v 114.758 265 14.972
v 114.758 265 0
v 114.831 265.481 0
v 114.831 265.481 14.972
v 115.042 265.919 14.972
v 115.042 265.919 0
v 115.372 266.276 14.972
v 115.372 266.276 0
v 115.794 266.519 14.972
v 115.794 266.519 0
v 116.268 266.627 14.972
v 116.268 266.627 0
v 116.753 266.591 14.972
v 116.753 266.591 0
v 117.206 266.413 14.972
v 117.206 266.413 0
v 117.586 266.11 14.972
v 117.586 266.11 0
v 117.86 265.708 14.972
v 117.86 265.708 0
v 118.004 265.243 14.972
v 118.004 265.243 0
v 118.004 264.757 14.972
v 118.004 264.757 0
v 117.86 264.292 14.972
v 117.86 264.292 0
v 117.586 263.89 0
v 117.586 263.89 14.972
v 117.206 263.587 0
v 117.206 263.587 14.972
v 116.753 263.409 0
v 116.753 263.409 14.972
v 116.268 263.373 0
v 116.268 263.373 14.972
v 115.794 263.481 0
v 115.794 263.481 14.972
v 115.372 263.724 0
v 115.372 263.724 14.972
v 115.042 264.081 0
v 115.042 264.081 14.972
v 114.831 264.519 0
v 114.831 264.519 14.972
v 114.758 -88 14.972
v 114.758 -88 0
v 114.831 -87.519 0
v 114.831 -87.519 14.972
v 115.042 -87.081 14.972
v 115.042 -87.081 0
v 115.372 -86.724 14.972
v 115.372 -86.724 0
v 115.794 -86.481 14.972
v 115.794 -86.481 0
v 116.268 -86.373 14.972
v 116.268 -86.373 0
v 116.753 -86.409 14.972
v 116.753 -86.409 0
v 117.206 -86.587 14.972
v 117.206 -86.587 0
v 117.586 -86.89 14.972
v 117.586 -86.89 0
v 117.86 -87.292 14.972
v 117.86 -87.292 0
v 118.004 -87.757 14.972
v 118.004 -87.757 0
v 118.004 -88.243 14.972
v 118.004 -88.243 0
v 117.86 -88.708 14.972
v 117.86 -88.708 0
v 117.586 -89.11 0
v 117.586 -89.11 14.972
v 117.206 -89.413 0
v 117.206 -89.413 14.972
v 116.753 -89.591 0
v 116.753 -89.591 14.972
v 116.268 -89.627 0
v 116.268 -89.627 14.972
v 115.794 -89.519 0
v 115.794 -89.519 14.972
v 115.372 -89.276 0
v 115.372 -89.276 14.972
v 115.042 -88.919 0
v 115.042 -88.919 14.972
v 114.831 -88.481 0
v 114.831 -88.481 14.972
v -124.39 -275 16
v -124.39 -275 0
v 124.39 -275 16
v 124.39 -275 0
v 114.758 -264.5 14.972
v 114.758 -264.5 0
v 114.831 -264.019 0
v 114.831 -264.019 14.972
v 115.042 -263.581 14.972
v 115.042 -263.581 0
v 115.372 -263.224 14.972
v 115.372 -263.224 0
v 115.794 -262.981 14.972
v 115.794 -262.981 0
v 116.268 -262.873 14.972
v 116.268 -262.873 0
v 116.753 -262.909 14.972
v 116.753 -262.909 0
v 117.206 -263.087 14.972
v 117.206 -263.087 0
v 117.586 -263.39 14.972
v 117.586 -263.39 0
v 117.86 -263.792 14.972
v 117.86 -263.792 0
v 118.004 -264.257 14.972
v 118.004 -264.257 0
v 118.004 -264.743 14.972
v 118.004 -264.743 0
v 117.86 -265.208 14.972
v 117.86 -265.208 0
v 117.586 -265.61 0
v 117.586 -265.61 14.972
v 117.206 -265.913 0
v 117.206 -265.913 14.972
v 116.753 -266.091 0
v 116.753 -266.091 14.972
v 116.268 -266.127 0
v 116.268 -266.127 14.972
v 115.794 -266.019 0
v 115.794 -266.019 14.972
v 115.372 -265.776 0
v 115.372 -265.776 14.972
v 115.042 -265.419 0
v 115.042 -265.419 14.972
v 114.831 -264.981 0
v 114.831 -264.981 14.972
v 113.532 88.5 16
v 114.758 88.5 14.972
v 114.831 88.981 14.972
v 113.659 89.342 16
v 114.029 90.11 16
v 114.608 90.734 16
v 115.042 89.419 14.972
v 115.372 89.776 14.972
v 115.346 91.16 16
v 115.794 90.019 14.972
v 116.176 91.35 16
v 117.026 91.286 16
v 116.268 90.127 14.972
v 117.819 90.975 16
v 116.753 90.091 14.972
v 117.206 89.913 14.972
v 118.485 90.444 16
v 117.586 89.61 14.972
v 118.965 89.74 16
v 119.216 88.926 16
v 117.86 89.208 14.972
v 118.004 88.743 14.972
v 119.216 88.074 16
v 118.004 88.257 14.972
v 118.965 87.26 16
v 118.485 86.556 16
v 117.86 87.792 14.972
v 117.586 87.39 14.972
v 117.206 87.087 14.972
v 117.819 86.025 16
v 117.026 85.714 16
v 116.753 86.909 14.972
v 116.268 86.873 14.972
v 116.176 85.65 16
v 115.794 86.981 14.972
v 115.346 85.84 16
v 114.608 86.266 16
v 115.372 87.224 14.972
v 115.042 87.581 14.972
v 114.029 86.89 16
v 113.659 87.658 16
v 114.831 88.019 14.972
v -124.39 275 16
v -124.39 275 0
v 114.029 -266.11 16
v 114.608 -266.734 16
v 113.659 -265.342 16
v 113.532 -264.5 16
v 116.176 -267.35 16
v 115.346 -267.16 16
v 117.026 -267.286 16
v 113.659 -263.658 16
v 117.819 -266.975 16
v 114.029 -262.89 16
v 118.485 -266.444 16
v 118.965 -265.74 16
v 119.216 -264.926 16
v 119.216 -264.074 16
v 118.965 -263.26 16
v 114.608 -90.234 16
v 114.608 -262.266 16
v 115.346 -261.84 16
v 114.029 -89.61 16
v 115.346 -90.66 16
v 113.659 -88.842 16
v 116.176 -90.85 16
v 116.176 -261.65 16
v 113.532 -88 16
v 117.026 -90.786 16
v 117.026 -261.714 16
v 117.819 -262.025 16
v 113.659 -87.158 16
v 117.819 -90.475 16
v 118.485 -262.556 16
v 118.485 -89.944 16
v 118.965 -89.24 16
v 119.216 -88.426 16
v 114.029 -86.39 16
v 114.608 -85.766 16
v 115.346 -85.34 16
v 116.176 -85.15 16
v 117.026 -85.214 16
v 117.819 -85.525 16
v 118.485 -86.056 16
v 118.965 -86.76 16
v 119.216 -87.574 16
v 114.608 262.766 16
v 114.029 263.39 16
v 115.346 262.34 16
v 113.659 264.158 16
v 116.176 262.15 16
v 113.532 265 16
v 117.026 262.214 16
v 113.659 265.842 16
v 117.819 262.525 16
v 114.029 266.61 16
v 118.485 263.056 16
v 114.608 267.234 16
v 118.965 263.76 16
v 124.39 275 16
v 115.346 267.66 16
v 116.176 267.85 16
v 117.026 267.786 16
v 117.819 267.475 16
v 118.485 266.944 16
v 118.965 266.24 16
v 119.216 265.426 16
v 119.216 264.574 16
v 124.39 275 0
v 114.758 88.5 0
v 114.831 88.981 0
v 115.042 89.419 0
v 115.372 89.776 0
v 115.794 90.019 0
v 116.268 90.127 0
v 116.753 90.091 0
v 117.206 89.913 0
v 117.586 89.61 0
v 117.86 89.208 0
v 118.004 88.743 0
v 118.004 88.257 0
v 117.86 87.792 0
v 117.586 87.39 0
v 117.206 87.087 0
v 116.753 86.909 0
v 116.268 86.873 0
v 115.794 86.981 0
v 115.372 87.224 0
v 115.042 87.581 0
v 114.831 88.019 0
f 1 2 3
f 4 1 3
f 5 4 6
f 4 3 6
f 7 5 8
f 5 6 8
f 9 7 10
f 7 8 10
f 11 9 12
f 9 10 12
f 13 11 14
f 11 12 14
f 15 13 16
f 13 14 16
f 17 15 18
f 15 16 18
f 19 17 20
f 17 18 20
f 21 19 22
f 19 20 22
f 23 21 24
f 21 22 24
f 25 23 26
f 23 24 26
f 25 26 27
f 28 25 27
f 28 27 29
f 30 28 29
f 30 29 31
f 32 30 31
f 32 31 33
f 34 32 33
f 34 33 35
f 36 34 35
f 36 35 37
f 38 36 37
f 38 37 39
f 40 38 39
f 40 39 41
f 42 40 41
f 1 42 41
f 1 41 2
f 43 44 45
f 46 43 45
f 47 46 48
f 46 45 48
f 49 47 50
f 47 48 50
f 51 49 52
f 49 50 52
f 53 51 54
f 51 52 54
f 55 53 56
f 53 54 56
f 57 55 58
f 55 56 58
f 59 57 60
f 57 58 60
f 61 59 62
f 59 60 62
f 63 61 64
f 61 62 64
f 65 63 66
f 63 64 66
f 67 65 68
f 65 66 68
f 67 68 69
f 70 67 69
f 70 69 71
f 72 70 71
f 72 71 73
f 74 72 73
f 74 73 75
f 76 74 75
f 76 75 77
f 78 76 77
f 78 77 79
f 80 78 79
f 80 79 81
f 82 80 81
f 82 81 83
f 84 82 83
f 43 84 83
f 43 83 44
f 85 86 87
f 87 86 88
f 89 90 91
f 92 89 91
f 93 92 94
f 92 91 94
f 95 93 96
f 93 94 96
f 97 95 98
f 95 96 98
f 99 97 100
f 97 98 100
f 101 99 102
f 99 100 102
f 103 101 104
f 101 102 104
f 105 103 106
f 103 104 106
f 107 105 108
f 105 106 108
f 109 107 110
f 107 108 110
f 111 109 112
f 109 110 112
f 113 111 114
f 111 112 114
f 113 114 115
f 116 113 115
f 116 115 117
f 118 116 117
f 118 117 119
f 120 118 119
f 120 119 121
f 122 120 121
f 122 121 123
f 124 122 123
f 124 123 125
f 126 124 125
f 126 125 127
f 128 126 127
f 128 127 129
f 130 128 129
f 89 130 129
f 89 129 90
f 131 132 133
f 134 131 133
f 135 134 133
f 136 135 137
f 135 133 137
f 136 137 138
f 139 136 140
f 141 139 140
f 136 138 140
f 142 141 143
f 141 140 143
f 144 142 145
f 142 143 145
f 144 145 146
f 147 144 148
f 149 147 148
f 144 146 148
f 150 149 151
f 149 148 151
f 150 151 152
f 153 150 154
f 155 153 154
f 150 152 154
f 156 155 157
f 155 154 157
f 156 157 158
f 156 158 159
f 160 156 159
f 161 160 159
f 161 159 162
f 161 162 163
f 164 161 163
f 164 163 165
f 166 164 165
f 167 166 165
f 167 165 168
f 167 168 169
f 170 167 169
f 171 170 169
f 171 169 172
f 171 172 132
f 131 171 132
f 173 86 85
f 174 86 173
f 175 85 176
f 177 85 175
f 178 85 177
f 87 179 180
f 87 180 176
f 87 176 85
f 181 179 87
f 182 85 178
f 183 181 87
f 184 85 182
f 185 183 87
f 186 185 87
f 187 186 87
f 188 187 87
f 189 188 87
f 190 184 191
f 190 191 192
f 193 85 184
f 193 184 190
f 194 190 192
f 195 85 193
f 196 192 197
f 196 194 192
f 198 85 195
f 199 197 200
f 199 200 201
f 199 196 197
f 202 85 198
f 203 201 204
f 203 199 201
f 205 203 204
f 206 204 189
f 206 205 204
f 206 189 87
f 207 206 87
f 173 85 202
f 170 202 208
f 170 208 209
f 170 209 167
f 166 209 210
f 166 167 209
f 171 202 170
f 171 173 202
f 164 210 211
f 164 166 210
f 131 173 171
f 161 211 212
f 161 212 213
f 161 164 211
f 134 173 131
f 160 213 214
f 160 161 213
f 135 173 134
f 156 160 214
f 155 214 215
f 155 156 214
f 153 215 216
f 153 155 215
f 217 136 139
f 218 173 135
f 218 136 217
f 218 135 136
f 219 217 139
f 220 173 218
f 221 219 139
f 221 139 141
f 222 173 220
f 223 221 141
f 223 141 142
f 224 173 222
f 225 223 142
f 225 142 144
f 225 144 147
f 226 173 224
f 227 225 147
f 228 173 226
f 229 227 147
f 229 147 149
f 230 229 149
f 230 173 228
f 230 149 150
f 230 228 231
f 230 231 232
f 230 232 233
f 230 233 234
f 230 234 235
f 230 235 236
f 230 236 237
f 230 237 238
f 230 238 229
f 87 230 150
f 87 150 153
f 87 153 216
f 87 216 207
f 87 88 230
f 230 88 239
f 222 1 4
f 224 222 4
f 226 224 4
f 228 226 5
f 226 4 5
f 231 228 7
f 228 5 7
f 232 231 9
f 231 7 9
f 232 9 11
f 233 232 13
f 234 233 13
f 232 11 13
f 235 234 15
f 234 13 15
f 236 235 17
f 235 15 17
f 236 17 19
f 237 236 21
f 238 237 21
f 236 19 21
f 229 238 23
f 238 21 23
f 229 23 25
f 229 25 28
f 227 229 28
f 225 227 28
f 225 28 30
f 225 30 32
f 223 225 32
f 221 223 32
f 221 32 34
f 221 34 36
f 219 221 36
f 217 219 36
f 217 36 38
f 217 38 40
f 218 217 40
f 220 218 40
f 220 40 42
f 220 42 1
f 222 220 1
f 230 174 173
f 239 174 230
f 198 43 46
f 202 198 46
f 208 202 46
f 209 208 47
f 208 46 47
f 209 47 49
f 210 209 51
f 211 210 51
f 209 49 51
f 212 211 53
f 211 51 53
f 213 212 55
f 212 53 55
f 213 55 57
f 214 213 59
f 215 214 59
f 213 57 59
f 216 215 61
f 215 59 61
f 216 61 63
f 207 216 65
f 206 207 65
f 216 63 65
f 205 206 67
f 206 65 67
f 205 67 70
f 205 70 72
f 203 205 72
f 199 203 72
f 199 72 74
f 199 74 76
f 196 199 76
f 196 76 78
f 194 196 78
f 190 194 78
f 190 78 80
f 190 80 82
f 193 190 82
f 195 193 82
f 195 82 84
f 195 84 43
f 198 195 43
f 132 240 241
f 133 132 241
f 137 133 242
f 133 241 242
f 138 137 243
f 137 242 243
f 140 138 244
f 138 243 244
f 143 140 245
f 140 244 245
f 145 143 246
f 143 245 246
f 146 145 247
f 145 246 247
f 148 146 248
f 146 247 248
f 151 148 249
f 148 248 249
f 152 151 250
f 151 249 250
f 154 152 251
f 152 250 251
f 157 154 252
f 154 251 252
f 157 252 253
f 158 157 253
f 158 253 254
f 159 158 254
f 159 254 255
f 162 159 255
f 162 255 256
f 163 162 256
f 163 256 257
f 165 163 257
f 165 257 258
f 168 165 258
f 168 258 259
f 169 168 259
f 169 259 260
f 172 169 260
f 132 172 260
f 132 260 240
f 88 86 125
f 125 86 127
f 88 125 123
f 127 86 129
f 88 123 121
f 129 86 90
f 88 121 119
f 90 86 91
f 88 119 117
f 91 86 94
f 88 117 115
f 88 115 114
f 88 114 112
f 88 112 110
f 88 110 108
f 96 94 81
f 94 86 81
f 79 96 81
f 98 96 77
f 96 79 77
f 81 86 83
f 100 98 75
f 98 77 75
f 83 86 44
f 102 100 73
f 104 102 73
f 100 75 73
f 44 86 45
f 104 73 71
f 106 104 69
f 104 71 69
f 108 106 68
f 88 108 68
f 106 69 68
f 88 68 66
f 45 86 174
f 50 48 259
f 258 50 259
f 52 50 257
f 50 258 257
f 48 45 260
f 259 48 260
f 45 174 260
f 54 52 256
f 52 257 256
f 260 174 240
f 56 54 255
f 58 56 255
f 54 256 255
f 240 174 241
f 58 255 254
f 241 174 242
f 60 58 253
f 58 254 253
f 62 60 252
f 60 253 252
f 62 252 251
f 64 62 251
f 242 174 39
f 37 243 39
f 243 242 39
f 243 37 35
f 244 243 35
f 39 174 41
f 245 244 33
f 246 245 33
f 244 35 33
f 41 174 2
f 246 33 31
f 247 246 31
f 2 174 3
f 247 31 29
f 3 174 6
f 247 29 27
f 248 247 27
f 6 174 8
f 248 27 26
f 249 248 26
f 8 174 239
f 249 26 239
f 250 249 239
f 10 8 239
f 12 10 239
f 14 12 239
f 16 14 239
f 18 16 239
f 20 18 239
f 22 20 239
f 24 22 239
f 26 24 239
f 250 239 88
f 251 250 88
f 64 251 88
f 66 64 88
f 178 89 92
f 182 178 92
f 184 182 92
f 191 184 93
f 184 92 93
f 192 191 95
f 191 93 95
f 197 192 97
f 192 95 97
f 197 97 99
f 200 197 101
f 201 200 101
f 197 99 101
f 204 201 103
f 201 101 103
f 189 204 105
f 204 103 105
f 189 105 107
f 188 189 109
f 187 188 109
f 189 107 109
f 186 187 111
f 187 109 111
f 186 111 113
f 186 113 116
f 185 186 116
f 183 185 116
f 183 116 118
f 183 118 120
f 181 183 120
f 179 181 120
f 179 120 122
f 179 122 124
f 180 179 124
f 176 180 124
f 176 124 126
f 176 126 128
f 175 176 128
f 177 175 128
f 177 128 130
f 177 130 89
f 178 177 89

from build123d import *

# Parameters (mm, degrees)
SKETCH1_W                                         = 248.78
SKETCH1_H                                         = 550
BOSS_EXTRUDE1_DEPTH                               = 16
CSK_FOR_4_FLAT_HEAD_MACHINE_SCREW_100_D           = 3.2639
CSK_FOR_4_FLAT_HEAD_MACHINE_SCREW_100_DEPTH       = 16
CSK_FOR_4_FLAT_HEAD_MACHINE_SCREW_100_CSINK_D     = 5.715
CSK_FOR_4_FLAT_HEAD_MACHINE_SCREW_100_CSINK_ANGLE = 100
LPATTERN1_COUNT                                   = 4
LPATTERN1_PITCH                                   = 176.5


with BuildPart() as part:
    # Sketch1 → Boss-Extrude1 (new body)
    with BuildSketch(Plane.XY):
        Rectangle(SKETCH1_W, SKETCH1_H)
    extrude(amount=BOSS_EXTRUDE1_DEPTH)

    # CSK for #4 Flat Head Machine Screw (100)1
    with Locations(Plane.XY.offset(16)):
        with Locations((116.39, -264.5)):
            csk_for_4_flat_head_machine_screw_100 = CounterSinkHole(CSK_FOR_4_FLAT_HEAD_MACHINE_SCREW_100_D / 2, CSK_FOR_4_FLAT_HEAD_MACHINE_SCREW_100_CSINK_D / 2, depth=CSK_FOR_4_FLAT_HEAD_MACHINE_SCREW_100_DEPTH, counter_sink_angle=CSK_FOR_4_FLAT_HEAD_MACHINE_SCREW_100_CSINK_ANGLE)

    # LPattern1: CSK for #4 Flat Head Machine Screw (100)1 ×4
    with Locations(*[(0, i * LPATTERN1_PITCH, 0) for i in range(1, LPATTERN1_COUNT)]):
        add(csk_for_4_flat_head_machine_screw_100, mode=Mode.SUBTRACT)


solid = part.part
